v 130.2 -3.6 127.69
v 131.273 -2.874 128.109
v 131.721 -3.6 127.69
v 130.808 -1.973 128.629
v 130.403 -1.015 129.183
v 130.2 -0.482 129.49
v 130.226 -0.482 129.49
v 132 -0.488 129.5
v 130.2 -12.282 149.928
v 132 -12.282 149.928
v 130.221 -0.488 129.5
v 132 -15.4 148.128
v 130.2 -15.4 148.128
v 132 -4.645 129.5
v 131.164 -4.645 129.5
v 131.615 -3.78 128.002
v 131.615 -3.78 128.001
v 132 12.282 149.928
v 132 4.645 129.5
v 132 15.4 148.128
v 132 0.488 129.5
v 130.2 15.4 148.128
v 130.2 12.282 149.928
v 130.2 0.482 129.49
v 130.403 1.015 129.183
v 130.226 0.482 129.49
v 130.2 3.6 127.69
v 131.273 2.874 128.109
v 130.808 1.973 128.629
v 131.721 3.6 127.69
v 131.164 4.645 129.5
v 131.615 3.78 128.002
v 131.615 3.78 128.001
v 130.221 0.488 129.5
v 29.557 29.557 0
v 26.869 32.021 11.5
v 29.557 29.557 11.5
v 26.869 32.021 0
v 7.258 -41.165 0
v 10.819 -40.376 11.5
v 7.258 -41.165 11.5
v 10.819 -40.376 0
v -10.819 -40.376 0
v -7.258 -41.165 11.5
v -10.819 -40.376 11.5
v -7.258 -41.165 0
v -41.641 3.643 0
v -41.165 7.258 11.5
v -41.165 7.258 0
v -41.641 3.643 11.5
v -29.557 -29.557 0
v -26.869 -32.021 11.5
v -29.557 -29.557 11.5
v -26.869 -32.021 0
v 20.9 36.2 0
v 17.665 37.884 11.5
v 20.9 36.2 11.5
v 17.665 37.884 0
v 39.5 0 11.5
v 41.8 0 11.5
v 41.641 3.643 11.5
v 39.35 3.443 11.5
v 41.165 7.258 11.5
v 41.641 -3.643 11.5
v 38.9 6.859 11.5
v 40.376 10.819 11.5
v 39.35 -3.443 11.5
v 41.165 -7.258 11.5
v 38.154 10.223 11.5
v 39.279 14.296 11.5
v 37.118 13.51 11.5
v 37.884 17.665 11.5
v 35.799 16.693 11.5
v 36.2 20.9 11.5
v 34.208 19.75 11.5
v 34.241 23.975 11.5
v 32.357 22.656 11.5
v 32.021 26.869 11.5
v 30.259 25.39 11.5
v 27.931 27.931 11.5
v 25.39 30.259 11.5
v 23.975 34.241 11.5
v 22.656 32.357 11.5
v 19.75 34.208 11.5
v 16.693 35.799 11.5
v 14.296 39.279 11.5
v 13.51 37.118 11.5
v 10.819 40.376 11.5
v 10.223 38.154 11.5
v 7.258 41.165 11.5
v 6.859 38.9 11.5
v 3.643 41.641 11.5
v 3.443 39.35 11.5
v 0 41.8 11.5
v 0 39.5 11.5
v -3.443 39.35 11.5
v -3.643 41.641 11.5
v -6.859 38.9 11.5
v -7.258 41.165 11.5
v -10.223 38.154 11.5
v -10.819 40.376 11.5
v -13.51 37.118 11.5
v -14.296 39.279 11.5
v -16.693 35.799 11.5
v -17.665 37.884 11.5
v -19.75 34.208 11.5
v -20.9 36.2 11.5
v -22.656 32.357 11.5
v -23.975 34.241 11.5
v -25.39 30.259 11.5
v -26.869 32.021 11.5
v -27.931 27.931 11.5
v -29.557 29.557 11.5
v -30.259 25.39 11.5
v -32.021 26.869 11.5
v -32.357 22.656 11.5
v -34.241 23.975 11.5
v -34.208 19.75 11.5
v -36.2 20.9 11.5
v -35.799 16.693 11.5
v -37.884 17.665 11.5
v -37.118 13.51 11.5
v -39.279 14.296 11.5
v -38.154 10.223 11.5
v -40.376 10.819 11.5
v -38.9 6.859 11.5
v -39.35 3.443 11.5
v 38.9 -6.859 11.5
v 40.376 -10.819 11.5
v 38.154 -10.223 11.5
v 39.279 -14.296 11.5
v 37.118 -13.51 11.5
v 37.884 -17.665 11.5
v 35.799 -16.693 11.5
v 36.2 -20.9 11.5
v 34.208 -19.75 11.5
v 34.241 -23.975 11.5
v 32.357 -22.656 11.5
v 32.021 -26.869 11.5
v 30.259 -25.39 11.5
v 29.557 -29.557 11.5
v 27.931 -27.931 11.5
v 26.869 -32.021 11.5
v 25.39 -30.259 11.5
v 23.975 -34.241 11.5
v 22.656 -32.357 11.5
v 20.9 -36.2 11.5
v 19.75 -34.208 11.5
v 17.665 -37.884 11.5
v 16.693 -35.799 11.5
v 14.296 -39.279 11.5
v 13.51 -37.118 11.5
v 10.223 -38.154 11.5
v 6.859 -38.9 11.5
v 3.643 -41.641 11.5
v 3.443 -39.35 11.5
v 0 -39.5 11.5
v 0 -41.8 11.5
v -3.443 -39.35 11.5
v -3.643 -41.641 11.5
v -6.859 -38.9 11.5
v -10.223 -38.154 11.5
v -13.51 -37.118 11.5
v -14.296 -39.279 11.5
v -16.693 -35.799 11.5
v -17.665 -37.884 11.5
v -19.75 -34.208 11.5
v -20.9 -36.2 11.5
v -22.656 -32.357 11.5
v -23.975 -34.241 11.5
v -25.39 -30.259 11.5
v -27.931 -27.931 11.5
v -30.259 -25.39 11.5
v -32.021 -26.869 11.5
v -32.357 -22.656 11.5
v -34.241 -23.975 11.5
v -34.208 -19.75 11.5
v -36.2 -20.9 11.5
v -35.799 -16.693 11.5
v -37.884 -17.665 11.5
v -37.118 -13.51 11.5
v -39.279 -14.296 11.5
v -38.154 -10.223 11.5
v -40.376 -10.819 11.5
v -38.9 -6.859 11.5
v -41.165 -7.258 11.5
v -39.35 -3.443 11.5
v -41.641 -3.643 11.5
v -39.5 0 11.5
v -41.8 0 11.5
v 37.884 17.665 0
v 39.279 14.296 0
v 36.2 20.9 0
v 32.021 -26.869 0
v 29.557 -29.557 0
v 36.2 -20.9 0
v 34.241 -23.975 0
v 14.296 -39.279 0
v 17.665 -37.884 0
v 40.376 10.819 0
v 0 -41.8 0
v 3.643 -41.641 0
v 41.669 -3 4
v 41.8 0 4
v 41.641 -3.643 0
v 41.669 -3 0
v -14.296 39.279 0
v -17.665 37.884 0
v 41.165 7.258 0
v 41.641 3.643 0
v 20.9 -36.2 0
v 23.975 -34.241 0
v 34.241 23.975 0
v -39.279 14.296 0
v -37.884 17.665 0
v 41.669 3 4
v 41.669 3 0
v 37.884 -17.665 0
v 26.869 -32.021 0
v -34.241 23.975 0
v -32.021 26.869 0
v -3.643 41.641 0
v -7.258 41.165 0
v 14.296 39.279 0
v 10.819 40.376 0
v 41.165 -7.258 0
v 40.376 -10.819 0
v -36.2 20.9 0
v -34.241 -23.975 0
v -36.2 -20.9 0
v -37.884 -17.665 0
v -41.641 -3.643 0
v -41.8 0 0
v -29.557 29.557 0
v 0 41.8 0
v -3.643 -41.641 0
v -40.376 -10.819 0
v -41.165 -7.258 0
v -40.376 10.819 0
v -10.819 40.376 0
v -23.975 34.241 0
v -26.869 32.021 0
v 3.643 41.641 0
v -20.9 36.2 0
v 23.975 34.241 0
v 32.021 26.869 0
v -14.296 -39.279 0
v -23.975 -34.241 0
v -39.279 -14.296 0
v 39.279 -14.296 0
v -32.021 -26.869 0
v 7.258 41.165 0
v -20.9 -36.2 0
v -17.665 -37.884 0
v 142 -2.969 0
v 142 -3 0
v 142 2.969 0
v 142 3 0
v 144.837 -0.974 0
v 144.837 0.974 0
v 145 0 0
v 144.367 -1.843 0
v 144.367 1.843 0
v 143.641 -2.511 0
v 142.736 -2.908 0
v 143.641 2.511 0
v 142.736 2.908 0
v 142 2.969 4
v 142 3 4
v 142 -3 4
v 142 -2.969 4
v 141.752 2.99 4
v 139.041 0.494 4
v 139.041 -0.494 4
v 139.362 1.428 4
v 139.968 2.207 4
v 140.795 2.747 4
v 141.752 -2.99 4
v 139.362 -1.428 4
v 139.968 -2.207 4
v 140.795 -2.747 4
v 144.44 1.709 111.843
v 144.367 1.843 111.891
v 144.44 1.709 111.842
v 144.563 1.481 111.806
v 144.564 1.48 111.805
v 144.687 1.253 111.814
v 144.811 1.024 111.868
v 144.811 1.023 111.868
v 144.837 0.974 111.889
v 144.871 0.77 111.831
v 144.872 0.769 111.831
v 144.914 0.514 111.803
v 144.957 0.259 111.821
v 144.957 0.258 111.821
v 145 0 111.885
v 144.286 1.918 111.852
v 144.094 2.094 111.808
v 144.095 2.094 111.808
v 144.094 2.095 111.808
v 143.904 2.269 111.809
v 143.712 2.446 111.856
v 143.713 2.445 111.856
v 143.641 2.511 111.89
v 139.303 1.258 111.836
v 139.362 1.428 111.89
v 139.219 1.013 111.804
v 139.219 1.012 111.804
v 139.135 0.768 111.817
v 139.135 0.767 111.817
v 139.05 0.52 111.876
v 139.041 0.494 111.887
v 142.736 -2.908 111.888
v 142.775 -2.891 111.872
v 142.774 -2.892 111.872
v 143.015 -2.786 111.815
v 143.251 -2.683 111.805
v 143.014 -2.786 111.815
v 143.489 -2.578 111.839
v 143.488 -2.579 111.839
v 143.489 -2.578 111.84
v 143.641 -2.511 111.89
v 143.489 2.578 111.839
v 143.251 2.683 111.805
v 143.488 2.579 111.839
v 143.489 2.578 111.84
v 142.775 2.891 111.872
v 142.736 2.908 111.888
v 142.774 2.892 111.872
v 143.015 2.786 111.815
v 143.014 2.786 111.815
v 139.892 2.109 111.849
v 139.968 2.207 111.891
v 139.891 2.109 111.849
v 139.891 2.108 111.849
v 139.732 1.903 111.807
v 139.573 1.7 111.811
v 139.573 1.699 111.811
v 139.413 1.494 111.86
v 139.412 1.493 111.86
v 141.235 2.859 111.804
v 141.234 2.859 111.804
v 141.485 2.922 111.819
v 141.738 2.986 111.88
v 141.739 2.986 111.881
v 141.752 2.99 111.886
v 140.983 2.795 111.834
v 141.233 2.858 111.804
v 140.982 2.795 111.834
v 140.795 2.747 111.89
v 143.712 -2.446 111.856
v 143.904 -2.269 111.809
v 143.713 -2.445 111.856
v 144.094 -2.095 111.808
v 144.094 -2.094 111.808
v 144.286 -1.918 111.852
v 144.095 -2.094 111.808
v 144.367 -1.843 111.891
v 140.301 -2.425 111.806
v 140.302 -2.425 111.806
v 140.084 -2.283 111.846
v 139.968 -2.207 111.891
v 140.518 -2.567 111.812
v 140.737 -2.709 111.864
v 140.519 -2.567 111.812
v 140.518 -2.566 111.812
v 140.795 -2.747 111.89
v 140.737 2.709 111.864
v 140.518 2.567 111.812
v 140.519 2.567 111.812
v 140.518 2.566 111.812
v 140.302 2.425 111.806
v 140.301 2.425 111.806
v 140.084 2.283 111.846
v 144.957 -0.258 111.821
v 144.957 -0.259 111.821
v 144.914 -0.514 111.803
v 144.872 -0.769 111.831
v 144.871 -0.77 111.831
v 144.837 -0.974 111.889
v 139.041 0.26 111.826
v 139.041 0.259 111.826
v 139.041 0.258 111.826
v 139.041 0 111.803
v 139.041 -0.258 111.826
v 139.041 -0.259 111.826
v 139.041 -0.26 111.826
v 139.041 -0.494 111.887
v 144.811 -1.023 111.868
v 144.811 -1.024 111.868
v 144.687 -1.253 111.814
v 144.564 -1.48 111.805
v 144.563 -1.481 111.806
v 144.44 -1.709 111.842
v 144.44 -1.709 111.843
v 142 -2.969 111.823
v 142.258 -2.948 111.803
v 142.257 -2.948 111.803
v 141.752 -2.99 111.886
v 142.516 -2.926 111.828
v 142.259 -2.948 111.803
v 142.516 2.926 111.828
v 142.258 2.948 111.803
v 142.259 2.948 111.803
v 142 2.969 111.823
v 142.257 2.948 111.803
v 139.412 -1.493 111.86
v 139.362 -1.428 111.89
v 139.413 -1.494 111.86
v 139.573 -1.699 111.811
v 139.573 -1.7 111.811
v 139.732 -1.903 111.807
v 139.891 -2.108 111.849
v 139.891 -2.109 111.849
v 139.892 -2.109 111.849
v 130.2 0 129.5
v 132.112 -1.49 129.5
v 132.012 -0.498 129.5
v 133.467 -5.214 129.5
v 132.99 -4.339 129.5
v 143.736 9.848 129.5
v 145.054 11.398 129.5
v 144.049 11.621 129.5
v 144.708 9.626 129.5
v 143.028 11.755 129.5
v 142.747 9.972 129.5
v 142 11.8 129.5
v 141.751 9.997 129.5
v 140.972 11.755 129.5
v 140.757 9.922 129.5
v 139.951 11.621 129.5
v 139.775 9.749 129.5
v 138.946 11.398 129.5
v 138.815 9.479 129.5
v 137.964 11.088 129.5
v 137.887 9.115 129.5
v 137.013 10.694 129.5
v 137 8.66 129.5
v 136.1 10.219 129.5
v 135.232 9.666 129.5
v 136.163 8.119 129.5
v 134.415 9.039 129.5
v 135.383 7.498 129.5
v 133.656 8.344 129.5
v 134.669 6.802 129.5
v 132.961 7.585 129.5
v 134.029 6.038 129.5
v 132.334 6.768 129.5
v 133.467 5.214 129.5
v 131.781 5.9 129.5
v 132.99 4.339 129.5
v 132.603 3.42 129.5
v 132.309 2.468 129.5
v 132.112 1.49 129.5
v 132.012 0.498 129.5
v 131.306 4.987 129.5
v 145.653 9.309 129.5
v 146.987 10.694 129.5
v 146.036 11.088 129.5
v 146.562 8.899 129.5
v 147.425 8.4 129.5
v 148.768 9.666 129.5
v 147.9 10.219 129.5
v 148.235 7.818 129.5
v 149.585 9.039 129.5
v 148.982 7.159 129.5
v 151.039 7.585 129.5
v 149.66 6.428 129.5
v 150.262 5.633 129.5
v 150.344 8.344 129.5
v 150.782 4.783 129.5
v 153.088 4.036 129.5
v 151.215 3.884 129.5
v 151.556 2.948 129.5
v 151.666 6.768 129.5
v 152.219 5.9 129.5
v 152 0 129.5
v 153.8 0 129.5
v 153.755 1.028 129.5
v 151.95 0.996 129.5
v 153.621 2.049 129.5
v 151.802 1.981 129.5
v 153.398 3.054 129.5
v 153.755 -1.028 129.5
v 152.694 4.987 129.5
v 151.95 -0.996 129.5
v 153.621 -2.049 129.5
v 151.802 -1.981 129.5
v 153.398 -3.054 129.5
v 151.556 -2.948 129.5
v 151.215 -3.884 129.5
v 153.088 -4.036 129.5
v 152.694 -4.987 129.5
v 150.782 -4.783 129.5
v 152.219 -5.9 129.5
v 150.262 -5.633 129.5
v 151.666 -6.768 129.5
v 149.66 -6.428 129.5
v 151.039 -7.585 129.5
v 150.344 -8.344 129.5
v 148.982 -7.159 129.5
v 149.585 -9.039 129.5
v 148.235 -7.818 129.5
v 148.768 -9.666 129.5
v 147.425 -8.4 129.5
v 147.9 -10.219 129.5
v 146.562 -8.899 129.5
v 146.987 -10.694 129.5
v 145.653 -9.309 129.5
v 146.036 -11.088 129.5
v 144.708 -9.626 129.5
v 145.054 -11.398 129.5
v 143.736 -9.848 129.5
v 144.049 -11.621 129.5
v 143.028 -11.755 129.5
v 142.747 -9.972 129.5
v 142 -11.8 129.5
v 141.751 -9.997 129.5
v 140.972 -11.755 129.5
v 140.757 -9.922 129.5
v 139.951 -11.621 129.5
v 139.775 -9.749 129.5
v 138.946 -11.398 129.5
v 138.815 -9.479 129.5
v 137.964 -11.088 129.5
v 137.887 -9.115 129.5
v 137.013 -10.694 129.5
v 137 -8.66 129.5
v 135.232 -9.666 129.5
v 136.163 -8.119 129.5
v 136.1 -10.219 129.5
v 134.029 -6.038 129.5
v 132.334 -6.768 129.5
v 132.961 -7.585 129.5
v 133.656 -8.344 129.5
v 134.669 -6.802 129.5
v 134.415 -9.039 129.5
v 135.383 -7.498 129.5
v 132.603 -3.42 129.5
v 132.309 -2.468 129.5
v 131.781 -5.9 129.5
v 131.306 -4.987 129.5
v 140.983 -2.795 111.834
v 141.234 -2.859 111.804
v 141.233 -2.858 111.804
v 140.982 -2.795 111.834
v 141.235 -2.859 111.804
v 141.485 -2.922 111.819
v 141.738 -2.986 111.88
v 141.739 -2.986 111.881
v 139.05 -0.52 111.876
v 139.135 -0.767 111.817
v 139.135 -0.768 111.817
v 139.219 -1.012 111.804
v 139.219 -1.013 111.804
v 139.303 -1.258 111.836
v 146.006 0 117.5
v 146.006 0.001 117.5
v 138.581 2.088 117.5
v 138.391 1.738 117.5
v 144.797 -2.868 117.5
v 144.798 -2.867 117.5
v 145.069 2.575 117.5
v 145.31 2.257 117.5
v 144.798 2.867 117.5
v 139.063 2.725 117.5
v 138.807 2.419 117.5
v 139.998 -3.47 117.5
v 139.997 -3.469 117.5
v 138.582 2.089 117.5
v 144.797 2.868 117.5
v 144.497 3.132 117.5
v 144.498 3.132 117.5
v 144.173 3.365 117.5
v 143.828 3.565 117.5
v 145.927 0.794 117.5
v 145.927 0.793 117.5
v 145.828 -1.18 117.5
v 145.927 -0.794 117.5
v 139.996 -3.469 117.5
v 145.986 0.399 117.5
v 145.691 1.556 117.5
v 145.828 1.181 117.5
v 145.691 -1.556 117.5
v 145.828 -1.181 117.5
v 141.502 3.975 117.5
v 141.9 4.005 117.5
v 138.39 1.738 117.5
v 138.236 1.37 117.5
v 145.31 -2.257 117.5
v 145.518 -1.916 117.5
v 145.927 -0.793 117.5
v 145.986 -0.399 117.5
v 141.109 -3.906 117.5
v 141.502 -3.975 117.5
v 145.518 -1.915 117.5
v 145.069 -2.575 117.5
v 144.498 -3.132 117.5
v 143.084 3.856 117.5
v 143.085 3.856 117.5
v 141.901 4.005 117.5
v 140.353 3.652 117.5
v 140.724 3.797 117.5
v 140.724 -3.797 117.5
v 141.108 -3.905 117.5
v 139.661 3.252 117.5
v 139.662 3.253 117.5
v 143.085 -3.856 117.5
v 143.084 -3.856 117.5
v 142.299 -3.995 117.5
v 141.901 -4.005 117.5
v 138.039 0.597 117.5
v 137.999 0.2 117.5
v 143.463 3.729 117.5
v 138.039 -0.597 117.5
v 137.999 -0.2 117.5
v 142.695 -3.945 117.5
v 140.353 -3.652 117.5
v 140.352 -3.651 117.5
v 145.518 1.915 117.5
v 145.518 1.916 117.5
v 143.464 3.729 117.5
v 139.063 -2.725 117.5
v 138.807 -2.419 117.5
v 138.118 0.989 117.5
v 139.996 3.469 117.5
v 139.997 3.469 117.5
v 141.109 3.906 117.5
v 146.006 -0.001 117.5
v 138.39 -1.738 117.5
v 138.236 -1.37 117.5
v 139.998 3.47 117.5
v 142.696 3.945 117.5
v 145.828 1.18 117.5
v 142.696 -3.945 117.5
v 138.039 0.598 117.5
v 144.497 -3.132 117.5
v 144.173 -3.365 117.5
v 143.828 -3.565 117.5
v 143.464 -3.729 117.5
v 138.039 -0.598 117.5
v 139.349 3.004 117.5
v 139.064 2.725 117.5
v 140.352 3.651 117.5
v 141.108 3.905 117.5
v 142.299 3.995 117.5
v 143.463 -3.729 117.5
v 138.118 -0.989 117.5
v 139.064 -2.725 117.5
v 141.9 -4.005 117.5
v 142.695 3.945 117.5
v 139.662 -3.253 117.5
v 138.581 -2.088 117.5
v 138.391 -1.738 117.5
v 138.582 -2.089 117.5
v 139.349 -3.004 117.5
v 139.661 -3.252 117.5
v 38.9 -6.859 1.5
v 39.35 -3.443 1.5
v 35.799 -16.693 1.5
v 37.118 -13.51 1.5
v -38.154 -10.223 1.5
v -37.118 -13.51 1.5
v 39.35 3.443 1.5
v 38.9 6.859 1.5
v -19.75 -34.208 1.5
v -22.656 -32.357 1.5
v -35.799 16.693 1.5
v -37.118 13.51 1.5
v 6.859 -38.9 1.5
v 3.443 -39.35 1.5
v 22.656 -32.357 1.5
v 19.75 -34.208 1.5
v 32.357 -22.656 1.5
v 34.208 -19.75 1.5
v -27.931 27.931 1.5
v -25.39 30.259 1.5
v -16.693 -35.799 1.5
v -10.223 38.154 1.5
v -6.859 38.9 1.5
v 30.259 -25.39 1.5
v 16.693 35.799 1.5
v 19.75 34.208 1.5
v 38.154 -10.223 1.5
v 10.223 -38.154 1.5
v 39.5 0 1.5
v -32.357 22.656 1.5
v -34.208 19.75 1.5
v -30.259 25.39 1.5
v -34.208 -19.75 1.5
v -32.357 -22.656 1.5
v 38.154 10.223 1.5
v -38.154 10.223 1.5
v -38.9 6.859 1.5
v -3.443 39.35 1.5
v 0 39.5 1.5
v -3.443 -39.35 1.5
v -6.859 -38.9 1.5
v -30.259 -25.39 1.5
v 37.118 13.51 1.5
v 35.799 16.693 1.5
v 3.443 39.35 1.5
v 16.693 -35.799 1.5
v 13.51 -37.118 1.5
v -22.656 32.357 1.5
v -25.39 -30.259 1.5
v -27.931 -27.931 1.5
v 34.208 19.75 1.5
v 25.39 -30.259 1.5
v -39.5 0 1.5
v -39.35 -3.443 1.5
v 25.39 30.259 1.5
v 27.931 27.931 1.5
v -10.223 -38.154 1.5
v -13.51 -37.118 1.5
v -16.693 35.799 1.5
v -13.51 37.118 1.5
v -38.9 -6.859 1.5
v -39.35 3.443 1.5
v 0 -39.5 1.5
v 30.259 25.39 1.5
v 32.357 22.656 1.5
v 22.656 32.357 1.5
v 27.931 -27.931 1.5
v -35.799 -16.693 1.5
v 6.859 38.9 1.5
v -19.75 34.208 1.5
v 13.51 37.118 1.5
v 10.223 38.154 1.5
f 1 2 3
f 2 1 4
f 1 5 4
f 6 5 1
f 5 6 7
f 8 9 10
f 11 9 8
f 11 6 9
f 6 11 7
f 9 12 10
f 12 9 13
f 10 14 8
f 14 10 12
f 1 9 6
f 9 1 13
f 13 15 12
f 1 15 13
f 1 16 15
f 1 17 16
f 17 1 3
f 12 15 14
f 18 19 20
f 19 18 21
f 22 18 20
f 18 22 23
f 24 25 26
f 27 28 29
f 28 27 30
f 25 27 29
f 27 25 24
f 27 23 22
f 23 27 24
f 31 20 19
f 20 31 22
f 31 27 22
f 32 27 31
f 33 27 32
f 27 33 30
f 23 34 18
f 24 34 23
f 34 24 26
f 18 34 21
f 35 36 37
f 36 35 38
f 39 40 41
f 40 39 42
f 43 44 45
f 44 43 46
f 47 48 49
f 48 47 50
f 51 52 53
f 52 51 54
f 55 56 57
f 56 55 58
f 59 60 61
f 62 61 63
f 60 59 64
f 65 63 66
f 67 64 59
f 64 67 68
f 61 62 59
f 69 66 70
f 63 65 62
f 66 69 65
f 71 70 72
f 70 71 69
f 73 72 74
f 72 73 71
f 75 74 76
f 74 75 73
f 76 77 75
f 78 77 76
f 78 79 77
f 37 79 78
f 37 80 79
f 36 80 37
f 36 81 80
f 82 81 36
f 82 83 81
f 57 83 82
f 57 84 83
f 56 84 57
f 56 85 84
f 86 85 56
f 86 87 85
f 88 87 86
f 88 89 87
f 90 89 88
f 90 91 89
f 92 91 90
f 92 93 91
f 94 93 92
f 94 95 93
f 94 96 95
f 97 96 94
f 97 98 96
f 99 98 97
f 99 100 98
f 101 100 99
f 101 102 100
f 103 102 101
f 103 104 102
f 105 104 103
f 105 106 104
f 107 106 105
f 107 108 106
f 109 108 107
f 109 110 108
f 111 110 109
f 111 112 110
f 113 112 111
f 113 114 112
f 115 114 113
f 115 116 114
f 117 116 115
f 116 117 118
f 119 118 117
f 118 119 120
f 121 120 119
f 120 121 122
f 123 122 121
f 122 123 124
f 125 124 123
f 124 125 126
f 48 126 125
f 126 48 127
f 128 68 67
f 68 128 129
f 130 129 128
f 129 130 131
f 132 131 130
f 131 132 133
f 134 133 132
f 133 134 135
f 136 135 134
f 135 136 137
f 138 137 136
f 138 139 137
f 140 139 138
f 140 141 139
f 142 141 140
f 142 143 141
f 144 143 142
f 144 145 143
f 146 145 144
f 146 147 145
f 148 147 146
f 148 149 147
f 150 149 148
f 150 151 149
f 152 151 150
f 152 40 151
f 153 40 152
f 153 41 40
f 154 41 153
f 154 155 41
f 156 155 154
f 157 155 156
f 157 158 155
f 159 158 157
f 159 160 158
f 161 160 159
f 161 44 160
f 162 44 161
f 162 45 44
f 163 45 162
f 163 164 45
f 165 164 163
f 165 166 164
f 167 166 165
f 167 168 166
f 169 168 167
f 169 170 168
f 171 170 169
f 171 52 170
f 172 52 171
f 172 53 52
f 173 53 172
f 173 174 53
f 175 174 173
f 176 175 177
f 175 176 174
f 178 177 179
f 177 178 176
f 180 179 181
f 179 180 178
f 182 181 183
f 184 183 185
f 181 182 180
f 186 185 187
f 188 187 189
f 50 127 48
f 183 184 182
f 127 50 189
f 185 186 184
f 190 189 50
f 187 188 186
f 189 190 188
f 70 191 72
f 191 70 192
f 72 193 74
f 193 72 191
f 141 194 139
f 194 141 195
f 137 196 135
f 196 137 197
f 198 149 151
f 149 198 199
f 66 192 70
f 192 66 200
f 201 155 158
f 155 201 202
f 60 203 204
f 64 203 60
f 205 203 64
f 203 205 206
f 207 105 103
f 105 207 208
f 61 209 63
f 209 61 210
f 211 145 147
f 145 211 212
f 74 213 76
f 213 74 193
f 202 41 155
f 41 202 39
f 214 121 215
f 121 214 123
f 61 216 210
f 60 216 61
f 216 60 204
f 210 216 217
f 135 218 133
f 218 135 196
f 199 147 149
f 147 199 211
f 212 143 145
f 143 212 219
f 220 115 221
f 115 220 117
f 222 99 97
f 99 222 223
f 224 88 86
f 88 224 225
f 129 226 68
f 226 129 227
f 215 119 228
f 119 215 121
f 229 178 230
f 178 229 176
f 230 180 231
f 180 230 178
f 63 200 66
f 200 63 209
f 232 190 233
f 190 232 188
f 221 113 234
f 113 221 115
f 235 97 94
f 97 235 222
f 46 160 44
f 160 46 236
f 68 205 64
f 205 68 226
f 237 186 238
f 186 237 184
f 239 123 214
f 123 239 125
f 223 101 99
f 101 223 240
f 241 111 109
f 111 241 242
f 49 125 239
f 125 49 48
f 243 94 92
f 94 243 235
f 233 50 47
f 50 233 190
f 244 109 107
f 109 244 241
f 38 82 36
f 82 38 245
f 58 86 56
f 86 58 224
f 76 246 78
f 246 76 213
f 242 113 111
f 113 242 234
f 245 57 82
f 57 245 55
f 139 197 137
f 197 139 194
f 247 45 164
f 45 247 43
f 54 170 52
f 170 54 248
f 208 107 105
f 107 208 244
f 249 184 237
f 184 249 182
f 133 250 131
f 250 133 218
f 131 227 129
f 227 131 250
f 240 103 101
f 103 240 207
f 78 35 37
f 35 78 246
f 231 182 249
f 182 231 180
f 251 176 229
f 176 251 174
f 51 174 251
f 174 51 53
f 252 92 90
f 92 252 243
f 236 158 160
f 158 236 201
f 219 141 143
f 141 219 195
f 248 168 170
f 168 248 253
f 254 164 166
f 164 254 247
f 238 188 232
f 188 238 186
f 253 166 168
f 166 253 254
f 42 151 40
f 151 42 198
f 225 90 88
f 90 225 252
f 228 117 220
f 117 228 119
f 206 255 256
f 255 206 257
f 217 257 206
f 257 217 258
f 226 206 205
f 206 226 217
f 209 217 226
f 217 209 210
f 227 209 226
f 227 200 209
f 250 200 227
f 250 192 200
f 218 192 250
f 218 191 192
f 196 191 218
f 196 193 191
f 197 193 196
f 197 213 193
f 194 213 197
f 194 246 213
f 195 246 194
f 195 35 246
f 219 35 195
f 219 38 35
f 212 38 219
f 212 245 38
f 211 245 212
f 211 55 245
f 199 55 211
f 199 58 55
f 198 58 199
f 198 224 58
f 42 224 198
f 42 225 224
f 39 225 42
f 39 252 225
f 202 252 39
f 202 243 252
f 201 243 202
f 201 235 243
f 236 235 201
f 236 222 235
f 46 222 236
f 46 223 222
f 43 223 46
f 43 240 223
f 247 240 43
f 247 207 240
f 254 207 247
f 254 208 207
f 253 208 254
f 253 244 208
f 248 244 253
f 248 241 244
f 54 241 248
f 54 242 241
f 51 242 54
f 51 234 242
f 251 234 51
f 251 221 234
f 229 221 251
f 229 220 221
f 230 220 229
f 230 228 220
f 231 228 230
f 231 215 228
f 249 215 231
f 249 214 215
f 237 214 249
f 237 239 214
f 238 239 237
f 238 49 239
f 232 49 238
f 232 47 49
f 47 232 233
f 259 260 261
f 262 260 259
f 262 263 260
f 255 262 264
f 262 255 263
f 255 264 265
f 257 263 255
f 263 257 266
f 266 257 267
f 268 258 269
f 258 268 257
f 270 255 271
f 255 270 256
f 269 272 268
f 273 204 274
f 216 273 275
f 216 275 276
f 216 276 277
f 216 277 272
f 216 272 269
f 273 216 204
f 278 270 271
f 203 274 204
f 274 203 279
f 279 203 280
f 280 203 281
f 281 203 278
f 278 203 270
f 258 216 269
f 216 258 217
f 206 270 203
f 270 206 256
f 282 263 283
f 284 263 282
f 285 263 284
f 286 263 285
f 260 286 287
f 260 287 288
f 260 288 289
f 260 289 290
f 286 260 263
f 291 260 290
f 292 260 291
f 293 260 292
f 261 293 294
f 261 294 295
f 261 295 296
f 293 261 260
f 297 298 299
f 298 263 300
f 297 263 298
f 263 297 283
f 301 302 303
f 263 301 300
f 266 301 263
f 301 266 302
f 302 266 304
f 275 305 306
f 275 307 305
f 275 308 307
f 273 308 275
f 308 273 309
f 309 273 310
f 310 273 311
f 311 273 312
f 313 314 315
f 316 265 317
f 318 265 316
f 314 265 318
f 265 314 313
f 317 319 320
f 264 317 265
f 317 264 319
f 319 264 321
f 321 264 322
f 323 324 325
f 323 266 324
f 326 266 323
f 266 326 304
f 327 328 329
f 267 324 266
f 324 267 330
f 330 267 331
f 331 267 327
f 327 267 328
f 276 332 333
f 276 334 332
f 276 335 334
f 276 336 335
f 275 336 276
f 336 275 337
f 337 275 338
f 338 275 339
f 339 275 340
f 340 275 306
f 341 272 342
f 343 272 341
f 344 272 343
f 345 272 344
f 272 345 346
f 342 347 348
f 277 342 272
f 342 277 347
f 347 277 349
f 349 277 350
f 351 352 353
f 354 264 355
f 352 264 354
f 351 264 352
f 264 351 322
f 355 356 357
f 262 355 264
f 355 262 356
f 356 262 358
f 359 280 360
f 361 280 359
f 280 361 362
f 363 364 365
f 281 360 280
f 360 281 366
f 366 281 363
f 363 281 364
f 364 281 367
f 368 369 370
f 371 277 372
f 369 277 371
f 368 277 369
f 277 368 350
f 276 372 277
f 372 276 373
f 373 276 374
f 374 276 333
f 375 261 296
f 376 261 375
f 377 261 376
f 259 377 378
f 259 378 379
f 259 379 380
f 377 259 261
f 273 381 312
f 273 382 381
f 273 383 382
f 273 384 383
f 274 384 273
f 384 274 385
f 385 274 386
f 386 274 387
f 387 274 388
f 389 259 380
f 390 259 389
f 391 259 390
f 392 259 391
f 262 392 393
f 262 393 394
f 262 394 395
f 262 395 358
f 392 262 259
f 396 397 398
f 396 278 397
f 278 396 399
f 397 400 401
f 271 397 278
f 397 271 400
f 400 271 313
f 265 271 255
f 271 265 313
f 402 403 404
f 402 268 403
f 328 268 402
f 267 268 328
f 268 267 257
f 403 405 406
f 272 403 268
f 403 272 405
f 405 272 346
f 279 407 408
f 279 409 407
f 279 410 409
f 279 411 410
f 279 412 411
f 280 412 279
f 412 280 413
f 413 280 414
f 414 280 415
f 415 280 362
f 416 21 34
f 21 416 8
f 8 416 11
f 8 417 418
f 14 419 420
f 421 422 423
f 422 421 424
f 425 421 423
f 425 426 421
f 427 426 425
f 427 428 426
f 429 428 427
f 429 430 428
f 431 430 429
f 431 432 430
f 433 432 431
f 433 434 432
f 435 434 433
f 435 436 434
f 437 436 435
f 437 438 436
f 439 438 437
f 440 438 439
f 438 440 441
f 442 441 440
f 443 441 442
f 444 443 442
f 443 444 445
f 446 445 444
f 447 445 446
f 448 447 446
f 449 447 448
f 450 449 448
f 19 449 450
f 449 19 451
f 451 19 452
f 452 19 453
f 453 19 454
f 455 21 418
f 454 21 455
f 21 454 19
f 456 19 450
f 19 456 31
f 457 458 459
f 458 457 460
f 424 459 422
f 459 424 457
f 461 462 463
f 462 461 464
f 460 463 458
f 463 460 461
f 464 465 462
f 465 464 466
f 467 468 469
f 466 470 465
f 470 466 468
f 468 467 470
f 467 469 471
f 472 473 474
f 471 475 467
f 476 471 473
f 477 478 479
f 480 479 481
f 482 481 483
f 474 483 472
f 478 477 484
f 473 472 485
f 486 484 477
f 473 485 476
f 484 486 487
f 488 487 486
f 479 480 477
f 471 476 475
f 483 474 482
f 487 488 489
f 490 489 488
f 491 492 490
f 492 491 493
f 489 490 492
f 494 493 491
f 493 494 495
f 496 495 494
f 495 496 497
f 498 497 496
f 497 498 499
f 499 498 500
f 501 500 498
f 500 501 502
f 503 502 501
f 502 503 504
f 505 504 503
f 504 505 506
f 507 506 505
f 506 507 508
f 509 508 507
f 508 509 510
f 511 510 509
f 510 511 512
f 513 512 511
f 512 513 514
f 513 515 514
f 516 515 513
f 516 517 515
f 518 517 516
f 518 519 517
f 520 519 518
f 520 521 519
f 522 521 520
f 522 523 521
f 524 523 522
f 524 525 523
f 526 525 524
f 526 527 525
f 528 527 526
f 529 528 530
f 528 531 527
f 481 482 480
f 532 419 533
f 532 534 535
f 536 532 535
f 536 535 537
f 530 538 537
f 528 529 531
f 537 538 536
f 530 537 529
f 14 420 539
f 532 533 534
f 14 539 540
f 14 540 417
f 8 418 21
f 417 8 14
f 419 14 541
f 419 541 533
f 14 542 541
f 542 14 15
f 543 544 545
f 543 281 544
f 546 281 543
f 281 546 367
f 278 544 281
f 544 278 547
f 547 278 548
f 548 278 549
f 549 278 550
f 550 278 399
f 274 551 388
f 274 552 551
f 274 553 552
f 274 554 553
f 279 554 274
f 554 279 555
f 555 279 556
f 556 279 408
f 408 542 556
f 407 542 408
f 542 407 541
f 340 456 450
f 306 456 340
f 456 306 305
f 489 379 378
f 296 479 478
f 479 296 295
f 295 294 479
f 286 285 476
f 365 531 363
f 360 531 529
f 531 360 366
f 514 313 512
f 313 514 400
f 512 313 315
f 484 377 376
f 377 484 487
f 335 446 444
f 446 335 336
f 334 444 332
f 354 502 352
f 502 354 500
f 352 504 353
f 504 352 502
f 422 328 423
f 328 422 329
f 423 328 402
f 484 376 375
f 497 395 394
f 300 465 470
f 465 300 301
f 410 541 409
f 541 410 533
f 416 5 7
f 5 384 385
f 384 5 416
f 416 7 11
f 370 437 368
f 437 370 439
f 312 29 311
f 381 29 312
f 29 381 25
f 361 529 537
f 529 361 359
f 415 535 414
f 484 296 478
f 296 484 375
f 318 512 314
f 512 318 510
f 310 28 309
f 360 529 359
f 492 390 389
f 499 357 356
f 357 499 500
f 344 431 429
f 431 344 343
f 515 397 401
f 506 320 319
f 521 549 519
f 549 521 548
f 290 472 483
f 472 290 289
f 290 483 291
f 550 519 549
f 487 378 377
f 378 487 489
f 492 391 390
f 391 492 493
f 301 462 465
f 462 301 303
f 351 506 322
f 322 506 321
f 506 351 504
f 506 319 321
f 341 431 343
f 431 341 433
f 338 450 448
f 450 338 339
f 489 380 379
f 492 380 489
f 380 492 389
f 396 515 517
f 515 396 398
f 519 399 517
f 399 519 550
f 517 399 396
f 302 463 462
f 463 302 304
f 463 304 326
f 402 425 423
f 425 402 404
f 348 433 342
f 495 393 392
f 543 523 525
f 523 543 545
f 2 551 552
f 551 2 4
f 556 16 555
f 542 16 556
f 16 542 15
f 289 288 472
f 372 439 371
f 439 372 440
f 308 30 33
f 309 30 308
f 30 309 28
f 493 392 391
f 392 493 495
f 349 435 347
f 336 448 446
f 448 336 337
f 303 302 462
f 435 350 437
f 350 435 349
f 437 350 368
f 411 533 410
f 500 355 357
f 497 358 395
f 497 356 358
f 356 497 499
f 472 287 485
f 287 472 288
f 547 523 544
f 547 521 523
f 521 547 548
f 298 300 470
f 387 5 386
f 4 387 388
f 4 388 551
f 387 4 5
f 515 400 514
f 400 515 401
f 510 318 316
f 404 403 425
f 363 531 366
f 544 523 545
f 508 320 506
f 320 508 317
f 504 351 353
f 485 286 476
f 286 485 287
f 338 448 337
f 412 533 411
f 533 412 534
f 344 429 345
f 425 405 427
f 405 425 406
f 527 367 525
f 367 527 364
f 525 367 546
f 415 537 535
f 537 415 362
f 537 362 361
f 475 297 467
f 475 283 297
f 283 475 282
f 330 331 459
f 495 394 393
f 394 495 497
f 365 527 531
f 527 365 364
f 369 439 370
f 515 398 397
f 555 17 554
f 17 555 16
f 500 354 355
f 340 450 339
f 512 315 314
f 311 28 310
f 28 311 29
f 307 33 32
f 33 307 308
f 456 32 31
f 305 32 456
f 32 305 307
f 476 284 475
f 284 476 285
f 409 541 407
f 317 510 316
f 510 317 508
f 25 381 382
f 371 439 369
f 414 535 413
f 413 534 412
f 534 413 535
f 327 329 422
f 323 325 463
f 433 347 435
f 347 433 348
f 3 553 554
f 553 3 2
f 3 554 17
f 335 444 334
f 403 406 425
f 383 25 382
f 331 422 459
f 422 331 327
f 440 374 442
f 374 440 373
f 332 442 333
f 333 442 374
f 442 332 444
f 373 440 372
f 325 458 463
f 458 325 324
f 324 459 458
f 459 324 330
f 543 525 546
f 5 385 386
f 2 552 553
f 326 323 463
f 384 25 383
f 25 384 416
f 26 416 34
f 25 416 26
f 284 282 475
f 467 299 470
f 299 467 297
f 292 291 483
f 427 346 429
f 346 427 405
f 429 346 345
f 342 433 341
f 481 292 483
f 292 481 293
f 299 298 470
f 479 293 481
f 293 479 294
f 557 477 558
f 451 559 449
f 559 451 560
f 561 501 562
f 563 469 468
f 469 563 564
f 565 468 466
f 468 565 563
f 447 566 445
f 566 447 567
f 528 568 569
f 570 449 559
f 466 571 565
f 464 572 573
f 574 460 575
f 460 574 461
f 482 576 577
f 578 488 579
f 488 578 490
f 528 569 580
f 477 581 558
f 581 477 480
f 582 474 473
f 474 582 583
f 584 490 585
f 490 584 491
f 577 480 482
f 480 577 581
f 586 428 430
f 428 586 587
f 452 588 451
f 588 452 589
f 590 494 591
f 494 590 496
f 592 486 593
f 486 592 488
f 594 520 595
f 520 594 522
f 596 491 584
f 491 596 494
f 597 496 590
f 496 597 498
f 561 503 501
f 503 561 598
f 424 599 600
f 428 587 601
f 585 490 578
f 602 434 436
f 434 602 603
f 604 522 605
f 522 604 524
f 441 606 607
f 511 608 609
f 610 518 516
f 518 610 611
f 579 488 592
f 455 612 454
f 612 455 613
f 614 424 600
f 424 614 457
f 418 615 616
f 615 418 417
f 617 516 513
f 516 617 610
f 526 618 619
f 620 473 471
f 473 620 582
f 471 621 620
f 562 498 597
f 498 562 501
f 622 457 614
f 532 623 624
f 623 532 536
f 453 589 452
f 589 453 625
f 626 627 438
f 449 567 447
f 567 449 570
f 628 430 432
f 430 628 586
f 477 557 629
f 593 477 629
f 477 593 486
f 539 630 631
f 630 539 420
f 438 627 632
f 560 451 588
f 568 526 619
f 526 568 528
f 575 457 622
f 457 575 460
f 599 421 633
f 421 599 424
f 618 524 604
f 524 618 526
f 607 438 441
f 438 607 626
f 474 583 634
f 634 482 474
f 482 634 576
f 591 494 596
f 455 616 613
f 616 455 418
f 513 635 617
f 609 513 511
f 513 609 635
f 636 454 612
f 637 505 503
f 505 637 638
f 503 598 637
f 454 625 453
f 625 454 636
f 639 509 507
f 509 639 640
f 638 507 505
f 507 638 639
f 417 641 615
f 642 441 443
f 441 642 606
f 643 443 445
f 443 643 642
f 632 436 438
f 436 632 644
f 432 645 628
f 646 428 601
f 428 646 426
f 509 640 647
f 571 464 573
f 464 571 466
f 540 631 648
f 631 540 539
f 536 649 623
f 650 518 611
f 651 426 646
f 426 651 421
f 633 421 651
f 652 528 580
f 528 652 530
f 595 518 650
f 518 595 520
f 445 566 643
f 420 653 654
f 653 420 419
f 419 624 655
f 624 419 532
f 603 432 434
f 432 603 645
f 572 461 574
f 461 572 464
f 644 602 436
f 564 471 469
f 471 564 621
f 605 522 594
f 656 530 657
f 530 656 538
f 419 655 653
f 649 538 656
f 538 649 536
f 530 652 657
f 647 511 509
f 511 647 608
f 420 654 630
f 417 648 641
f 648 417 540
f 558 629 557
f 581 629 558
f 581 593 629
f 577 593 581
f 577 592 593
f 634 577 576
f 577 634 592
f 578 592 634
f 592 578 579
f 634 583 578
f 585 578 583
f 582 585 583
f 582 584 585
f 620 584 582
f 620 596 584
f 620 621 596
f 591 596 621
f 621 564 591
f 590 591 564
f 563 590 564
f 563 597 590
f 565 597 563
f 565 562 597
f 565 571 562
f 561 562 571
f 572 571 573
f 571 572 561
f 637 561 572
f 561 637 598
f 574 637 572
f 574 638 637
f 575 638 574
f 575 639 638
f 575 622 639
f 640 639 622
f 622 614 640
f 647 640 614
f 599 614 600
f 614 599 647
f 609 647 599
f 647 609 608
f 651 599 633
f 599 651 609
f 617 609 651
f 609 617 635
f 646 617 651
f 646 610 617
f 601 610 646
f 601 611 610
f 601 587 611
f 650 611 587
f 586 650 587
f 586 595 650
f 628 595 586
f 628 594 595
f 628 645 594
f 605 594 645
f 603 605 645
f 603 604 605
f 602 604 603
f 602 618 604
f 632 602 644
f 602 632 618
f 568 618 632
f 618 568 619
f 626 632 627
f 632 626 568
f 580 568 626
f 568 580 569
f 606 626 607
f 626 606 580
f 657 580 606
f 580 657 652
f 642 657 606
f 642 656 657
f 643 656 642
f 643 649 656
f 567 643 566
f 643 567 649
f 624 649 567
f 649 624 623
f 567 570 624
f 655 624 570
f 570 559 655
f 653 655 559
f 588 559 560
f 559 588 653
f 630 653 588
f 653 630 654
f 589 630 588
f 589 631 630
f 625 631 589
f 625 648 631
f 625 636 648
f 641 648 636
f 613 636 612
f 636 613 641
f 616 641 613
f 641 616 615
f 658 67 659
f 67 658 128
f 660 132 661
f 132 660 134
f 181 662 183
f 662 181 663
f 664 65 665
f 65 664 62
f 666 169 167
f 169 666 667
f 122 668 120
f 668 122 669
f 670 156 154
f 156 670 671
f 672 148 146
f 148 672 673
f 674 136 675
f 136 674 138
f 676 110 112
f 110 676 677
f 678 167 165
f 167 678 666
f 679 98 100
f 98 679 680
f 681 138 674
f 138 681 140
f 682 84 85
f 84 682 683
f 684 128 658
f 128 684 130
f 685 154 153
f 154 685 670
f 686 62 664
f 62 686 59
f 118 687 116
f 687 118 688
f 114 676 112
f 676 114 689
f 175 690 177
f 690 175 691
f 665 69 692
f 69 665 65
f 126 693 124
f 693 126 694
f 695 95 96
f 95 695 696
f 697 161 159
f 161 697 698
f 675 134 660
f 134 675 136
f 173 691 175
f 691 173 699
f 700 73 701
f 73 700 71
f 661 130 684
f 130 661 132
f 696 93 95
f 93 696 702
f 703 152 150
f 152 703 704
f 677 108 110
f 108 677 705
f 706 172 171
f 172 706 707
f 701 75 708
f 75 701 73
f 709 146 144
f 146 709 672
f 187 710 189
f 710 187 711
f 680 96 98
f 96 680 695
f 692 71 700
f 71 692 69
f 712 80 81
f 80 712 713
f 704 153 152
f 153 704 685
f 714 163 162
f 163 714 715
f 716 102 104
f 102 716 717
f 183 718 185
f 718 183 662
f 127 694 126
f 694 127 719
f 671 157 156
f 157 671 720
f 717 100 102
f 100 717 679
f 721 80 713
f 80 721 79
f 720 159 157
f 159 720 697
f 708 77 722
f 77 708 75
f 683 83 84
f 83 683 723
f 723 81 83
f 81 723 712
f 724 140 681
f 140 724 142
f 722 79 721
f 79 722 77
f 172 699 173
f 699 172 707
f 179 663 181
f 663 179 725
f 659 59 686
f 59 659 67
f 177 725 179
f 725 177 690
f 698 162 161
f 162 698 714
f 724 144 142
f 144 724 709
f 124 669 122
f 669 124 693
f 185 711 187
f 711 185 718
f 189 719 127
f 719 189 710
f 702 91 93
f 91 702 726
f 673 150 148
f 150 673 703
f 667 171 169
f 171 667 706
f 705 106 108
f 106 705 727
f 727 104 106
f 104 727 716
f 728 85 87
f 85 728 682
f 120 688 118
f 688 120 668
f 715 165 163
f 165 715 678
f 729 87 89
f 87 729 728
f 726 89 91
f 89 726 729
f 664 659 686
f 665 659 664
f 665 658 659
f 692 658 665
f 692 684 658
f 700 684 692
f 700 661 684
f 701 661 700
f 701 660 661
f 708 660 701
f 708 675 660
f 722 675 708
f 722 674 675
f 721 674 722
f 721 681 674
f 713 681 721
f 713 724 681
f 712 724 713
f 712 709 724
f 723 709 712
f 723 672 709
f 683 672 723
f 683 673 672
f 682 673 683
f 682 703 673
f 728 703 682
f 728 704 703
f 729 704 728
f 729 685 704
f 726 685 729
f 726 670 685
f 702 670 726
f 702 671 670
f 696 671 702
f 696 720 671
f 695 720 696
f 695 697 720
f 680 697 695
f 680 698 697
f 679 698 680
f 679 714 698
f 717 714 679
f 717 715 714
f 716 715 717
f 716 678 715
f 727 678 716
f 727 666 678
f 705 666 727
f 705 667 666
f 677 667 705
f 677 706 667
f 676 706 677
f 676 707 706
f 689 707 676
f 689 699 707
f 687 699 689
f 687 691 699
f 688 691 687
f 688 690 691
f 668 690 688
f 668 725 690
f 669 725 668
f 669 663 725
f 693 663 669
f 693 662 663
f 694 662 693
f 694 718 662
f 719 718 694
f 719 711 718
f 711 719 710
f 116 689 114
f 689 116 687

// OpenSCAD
// -*- mode: SCAD ; c-file-style: "ellemtel" ; coding: utf-8 -*-
//
// A stand for my oil can that catches the oil dripping out the tip
//
// © 2017 Roland Sieker <ospalh@gmail.com>
// Licence: CC-BY-SA 4.0



// Diameter of the oil can
d_can = 79;  // [20:1:150]
// Hight of the oiling tip above ground
h_tip = 133;  // [20:1:170]
// Distance of the tip from the center of the can
x_tip = 142;   // [20:1:200]


// Set this to “render” when done, then hit “Create Thing”
preview = 1; // [0: render, 1: preview]


/* [Hidden] */

// Done with the customizer

// *******************************************************
// Extra parameters. These can be changed reasonably safely.


clearance = 0.5;  // extra size for the can
b = 1.5;  // Thickness of the bottom plate
b_c = 4;  // Thickness of the connector
r_catcher = 10;  // radius of the oil catcher pot
w = 1.8;  // wall strength;
r_stem = 3;  // diameter of the oil catcher pot stem
h_can = 10;  // hight of the can wall
h_clear = 5;  // distance from the tip to the catcher pot
pot_bottom_hight = 8;  // To give the catcher got a bit of a flat bottom
l_horns = 20;


// *******************************************************
// Some shortcuts. These shouldn’t be changed

tau = 2 * PI;  // π is still wrong. τ = circumference ÷ r

r_can = d_can/2;

some_distance = 50;
ms = 0.01;  // Muggeseggele.

// fn for differently sized objects and fs, fa; all for preview or rendering.
pna = 40;
pnb = 15;
pa = 5;
ps = 1;
rna = 180;
rnb = 30;
ra = 1;
rs = 0.1;
function na() = (preview) ? pna : rna;
function nb() = (preview) ? pnb : rnb;
$fs = (preview) ? ps : rs;
$fa = (preview) ? pa : ra;

// Calculated
h_ct = h_tip-h_clear+b;
h_cc = 2*r_catcher;
h_cb = h_ct - h_cc;

// *******************************************************
// End setup



oilcan_stand();

module oilcan_stand()
{
   difference()
   {
      union()
      {
         solid_can_stand();
         connector();
         stem();
         solid_catcher();
         horns();
      }
      can_hollow();
      catcher_hollow();
   }
}

module solid_can_stand()
{

   cylinder(r=r_can+w+clearance, h=h_can+b);
}

module connector()
{
   translate([0,-r_stem,0])
   {
      cube([x_tip, 2*r_stem, b_c]);
   }
}

module stem()
{
   translate([x_tip,0,0])
   {
      cylinder(r=r_stem, h=h_ct);
   }
}

module solid_catcher()
{
   translate([x_tip,0,h_cb-2*w])
   {
      cylinder(r1=ms, r2=r_catcher+w, h=h_cc+2*w);
   }
}

module horns()
{
   horn();
   mirror([0,1,0])
   {
      horn();
   }
}

module horn()
{
   translate([x_tip-r_catcher-w, -2*w, h_ct-ms-w])
   {
      rotate([30, 0, 0])
      {
         cube([w, 2*w, l_horns+2*w]);
      }
   }
}

module can_hollow()
{
   translate([0,0, b])
   {
      cylinder(r=r_can, h=h_can+ms);
   }
}

module catcher_hollow()
{

   translate([x_tip,0,h_cb])
   {
      intersection()
      {
         cylinder(r1=ms, r2=r_catcher+ms, h=h_cc+2*ms);
         translate([0,0,pot_bottom_hight])
         {
            cylinder(r=r_catcher+2*ms, h=h_cc+2);
         }
      }
   }

}
